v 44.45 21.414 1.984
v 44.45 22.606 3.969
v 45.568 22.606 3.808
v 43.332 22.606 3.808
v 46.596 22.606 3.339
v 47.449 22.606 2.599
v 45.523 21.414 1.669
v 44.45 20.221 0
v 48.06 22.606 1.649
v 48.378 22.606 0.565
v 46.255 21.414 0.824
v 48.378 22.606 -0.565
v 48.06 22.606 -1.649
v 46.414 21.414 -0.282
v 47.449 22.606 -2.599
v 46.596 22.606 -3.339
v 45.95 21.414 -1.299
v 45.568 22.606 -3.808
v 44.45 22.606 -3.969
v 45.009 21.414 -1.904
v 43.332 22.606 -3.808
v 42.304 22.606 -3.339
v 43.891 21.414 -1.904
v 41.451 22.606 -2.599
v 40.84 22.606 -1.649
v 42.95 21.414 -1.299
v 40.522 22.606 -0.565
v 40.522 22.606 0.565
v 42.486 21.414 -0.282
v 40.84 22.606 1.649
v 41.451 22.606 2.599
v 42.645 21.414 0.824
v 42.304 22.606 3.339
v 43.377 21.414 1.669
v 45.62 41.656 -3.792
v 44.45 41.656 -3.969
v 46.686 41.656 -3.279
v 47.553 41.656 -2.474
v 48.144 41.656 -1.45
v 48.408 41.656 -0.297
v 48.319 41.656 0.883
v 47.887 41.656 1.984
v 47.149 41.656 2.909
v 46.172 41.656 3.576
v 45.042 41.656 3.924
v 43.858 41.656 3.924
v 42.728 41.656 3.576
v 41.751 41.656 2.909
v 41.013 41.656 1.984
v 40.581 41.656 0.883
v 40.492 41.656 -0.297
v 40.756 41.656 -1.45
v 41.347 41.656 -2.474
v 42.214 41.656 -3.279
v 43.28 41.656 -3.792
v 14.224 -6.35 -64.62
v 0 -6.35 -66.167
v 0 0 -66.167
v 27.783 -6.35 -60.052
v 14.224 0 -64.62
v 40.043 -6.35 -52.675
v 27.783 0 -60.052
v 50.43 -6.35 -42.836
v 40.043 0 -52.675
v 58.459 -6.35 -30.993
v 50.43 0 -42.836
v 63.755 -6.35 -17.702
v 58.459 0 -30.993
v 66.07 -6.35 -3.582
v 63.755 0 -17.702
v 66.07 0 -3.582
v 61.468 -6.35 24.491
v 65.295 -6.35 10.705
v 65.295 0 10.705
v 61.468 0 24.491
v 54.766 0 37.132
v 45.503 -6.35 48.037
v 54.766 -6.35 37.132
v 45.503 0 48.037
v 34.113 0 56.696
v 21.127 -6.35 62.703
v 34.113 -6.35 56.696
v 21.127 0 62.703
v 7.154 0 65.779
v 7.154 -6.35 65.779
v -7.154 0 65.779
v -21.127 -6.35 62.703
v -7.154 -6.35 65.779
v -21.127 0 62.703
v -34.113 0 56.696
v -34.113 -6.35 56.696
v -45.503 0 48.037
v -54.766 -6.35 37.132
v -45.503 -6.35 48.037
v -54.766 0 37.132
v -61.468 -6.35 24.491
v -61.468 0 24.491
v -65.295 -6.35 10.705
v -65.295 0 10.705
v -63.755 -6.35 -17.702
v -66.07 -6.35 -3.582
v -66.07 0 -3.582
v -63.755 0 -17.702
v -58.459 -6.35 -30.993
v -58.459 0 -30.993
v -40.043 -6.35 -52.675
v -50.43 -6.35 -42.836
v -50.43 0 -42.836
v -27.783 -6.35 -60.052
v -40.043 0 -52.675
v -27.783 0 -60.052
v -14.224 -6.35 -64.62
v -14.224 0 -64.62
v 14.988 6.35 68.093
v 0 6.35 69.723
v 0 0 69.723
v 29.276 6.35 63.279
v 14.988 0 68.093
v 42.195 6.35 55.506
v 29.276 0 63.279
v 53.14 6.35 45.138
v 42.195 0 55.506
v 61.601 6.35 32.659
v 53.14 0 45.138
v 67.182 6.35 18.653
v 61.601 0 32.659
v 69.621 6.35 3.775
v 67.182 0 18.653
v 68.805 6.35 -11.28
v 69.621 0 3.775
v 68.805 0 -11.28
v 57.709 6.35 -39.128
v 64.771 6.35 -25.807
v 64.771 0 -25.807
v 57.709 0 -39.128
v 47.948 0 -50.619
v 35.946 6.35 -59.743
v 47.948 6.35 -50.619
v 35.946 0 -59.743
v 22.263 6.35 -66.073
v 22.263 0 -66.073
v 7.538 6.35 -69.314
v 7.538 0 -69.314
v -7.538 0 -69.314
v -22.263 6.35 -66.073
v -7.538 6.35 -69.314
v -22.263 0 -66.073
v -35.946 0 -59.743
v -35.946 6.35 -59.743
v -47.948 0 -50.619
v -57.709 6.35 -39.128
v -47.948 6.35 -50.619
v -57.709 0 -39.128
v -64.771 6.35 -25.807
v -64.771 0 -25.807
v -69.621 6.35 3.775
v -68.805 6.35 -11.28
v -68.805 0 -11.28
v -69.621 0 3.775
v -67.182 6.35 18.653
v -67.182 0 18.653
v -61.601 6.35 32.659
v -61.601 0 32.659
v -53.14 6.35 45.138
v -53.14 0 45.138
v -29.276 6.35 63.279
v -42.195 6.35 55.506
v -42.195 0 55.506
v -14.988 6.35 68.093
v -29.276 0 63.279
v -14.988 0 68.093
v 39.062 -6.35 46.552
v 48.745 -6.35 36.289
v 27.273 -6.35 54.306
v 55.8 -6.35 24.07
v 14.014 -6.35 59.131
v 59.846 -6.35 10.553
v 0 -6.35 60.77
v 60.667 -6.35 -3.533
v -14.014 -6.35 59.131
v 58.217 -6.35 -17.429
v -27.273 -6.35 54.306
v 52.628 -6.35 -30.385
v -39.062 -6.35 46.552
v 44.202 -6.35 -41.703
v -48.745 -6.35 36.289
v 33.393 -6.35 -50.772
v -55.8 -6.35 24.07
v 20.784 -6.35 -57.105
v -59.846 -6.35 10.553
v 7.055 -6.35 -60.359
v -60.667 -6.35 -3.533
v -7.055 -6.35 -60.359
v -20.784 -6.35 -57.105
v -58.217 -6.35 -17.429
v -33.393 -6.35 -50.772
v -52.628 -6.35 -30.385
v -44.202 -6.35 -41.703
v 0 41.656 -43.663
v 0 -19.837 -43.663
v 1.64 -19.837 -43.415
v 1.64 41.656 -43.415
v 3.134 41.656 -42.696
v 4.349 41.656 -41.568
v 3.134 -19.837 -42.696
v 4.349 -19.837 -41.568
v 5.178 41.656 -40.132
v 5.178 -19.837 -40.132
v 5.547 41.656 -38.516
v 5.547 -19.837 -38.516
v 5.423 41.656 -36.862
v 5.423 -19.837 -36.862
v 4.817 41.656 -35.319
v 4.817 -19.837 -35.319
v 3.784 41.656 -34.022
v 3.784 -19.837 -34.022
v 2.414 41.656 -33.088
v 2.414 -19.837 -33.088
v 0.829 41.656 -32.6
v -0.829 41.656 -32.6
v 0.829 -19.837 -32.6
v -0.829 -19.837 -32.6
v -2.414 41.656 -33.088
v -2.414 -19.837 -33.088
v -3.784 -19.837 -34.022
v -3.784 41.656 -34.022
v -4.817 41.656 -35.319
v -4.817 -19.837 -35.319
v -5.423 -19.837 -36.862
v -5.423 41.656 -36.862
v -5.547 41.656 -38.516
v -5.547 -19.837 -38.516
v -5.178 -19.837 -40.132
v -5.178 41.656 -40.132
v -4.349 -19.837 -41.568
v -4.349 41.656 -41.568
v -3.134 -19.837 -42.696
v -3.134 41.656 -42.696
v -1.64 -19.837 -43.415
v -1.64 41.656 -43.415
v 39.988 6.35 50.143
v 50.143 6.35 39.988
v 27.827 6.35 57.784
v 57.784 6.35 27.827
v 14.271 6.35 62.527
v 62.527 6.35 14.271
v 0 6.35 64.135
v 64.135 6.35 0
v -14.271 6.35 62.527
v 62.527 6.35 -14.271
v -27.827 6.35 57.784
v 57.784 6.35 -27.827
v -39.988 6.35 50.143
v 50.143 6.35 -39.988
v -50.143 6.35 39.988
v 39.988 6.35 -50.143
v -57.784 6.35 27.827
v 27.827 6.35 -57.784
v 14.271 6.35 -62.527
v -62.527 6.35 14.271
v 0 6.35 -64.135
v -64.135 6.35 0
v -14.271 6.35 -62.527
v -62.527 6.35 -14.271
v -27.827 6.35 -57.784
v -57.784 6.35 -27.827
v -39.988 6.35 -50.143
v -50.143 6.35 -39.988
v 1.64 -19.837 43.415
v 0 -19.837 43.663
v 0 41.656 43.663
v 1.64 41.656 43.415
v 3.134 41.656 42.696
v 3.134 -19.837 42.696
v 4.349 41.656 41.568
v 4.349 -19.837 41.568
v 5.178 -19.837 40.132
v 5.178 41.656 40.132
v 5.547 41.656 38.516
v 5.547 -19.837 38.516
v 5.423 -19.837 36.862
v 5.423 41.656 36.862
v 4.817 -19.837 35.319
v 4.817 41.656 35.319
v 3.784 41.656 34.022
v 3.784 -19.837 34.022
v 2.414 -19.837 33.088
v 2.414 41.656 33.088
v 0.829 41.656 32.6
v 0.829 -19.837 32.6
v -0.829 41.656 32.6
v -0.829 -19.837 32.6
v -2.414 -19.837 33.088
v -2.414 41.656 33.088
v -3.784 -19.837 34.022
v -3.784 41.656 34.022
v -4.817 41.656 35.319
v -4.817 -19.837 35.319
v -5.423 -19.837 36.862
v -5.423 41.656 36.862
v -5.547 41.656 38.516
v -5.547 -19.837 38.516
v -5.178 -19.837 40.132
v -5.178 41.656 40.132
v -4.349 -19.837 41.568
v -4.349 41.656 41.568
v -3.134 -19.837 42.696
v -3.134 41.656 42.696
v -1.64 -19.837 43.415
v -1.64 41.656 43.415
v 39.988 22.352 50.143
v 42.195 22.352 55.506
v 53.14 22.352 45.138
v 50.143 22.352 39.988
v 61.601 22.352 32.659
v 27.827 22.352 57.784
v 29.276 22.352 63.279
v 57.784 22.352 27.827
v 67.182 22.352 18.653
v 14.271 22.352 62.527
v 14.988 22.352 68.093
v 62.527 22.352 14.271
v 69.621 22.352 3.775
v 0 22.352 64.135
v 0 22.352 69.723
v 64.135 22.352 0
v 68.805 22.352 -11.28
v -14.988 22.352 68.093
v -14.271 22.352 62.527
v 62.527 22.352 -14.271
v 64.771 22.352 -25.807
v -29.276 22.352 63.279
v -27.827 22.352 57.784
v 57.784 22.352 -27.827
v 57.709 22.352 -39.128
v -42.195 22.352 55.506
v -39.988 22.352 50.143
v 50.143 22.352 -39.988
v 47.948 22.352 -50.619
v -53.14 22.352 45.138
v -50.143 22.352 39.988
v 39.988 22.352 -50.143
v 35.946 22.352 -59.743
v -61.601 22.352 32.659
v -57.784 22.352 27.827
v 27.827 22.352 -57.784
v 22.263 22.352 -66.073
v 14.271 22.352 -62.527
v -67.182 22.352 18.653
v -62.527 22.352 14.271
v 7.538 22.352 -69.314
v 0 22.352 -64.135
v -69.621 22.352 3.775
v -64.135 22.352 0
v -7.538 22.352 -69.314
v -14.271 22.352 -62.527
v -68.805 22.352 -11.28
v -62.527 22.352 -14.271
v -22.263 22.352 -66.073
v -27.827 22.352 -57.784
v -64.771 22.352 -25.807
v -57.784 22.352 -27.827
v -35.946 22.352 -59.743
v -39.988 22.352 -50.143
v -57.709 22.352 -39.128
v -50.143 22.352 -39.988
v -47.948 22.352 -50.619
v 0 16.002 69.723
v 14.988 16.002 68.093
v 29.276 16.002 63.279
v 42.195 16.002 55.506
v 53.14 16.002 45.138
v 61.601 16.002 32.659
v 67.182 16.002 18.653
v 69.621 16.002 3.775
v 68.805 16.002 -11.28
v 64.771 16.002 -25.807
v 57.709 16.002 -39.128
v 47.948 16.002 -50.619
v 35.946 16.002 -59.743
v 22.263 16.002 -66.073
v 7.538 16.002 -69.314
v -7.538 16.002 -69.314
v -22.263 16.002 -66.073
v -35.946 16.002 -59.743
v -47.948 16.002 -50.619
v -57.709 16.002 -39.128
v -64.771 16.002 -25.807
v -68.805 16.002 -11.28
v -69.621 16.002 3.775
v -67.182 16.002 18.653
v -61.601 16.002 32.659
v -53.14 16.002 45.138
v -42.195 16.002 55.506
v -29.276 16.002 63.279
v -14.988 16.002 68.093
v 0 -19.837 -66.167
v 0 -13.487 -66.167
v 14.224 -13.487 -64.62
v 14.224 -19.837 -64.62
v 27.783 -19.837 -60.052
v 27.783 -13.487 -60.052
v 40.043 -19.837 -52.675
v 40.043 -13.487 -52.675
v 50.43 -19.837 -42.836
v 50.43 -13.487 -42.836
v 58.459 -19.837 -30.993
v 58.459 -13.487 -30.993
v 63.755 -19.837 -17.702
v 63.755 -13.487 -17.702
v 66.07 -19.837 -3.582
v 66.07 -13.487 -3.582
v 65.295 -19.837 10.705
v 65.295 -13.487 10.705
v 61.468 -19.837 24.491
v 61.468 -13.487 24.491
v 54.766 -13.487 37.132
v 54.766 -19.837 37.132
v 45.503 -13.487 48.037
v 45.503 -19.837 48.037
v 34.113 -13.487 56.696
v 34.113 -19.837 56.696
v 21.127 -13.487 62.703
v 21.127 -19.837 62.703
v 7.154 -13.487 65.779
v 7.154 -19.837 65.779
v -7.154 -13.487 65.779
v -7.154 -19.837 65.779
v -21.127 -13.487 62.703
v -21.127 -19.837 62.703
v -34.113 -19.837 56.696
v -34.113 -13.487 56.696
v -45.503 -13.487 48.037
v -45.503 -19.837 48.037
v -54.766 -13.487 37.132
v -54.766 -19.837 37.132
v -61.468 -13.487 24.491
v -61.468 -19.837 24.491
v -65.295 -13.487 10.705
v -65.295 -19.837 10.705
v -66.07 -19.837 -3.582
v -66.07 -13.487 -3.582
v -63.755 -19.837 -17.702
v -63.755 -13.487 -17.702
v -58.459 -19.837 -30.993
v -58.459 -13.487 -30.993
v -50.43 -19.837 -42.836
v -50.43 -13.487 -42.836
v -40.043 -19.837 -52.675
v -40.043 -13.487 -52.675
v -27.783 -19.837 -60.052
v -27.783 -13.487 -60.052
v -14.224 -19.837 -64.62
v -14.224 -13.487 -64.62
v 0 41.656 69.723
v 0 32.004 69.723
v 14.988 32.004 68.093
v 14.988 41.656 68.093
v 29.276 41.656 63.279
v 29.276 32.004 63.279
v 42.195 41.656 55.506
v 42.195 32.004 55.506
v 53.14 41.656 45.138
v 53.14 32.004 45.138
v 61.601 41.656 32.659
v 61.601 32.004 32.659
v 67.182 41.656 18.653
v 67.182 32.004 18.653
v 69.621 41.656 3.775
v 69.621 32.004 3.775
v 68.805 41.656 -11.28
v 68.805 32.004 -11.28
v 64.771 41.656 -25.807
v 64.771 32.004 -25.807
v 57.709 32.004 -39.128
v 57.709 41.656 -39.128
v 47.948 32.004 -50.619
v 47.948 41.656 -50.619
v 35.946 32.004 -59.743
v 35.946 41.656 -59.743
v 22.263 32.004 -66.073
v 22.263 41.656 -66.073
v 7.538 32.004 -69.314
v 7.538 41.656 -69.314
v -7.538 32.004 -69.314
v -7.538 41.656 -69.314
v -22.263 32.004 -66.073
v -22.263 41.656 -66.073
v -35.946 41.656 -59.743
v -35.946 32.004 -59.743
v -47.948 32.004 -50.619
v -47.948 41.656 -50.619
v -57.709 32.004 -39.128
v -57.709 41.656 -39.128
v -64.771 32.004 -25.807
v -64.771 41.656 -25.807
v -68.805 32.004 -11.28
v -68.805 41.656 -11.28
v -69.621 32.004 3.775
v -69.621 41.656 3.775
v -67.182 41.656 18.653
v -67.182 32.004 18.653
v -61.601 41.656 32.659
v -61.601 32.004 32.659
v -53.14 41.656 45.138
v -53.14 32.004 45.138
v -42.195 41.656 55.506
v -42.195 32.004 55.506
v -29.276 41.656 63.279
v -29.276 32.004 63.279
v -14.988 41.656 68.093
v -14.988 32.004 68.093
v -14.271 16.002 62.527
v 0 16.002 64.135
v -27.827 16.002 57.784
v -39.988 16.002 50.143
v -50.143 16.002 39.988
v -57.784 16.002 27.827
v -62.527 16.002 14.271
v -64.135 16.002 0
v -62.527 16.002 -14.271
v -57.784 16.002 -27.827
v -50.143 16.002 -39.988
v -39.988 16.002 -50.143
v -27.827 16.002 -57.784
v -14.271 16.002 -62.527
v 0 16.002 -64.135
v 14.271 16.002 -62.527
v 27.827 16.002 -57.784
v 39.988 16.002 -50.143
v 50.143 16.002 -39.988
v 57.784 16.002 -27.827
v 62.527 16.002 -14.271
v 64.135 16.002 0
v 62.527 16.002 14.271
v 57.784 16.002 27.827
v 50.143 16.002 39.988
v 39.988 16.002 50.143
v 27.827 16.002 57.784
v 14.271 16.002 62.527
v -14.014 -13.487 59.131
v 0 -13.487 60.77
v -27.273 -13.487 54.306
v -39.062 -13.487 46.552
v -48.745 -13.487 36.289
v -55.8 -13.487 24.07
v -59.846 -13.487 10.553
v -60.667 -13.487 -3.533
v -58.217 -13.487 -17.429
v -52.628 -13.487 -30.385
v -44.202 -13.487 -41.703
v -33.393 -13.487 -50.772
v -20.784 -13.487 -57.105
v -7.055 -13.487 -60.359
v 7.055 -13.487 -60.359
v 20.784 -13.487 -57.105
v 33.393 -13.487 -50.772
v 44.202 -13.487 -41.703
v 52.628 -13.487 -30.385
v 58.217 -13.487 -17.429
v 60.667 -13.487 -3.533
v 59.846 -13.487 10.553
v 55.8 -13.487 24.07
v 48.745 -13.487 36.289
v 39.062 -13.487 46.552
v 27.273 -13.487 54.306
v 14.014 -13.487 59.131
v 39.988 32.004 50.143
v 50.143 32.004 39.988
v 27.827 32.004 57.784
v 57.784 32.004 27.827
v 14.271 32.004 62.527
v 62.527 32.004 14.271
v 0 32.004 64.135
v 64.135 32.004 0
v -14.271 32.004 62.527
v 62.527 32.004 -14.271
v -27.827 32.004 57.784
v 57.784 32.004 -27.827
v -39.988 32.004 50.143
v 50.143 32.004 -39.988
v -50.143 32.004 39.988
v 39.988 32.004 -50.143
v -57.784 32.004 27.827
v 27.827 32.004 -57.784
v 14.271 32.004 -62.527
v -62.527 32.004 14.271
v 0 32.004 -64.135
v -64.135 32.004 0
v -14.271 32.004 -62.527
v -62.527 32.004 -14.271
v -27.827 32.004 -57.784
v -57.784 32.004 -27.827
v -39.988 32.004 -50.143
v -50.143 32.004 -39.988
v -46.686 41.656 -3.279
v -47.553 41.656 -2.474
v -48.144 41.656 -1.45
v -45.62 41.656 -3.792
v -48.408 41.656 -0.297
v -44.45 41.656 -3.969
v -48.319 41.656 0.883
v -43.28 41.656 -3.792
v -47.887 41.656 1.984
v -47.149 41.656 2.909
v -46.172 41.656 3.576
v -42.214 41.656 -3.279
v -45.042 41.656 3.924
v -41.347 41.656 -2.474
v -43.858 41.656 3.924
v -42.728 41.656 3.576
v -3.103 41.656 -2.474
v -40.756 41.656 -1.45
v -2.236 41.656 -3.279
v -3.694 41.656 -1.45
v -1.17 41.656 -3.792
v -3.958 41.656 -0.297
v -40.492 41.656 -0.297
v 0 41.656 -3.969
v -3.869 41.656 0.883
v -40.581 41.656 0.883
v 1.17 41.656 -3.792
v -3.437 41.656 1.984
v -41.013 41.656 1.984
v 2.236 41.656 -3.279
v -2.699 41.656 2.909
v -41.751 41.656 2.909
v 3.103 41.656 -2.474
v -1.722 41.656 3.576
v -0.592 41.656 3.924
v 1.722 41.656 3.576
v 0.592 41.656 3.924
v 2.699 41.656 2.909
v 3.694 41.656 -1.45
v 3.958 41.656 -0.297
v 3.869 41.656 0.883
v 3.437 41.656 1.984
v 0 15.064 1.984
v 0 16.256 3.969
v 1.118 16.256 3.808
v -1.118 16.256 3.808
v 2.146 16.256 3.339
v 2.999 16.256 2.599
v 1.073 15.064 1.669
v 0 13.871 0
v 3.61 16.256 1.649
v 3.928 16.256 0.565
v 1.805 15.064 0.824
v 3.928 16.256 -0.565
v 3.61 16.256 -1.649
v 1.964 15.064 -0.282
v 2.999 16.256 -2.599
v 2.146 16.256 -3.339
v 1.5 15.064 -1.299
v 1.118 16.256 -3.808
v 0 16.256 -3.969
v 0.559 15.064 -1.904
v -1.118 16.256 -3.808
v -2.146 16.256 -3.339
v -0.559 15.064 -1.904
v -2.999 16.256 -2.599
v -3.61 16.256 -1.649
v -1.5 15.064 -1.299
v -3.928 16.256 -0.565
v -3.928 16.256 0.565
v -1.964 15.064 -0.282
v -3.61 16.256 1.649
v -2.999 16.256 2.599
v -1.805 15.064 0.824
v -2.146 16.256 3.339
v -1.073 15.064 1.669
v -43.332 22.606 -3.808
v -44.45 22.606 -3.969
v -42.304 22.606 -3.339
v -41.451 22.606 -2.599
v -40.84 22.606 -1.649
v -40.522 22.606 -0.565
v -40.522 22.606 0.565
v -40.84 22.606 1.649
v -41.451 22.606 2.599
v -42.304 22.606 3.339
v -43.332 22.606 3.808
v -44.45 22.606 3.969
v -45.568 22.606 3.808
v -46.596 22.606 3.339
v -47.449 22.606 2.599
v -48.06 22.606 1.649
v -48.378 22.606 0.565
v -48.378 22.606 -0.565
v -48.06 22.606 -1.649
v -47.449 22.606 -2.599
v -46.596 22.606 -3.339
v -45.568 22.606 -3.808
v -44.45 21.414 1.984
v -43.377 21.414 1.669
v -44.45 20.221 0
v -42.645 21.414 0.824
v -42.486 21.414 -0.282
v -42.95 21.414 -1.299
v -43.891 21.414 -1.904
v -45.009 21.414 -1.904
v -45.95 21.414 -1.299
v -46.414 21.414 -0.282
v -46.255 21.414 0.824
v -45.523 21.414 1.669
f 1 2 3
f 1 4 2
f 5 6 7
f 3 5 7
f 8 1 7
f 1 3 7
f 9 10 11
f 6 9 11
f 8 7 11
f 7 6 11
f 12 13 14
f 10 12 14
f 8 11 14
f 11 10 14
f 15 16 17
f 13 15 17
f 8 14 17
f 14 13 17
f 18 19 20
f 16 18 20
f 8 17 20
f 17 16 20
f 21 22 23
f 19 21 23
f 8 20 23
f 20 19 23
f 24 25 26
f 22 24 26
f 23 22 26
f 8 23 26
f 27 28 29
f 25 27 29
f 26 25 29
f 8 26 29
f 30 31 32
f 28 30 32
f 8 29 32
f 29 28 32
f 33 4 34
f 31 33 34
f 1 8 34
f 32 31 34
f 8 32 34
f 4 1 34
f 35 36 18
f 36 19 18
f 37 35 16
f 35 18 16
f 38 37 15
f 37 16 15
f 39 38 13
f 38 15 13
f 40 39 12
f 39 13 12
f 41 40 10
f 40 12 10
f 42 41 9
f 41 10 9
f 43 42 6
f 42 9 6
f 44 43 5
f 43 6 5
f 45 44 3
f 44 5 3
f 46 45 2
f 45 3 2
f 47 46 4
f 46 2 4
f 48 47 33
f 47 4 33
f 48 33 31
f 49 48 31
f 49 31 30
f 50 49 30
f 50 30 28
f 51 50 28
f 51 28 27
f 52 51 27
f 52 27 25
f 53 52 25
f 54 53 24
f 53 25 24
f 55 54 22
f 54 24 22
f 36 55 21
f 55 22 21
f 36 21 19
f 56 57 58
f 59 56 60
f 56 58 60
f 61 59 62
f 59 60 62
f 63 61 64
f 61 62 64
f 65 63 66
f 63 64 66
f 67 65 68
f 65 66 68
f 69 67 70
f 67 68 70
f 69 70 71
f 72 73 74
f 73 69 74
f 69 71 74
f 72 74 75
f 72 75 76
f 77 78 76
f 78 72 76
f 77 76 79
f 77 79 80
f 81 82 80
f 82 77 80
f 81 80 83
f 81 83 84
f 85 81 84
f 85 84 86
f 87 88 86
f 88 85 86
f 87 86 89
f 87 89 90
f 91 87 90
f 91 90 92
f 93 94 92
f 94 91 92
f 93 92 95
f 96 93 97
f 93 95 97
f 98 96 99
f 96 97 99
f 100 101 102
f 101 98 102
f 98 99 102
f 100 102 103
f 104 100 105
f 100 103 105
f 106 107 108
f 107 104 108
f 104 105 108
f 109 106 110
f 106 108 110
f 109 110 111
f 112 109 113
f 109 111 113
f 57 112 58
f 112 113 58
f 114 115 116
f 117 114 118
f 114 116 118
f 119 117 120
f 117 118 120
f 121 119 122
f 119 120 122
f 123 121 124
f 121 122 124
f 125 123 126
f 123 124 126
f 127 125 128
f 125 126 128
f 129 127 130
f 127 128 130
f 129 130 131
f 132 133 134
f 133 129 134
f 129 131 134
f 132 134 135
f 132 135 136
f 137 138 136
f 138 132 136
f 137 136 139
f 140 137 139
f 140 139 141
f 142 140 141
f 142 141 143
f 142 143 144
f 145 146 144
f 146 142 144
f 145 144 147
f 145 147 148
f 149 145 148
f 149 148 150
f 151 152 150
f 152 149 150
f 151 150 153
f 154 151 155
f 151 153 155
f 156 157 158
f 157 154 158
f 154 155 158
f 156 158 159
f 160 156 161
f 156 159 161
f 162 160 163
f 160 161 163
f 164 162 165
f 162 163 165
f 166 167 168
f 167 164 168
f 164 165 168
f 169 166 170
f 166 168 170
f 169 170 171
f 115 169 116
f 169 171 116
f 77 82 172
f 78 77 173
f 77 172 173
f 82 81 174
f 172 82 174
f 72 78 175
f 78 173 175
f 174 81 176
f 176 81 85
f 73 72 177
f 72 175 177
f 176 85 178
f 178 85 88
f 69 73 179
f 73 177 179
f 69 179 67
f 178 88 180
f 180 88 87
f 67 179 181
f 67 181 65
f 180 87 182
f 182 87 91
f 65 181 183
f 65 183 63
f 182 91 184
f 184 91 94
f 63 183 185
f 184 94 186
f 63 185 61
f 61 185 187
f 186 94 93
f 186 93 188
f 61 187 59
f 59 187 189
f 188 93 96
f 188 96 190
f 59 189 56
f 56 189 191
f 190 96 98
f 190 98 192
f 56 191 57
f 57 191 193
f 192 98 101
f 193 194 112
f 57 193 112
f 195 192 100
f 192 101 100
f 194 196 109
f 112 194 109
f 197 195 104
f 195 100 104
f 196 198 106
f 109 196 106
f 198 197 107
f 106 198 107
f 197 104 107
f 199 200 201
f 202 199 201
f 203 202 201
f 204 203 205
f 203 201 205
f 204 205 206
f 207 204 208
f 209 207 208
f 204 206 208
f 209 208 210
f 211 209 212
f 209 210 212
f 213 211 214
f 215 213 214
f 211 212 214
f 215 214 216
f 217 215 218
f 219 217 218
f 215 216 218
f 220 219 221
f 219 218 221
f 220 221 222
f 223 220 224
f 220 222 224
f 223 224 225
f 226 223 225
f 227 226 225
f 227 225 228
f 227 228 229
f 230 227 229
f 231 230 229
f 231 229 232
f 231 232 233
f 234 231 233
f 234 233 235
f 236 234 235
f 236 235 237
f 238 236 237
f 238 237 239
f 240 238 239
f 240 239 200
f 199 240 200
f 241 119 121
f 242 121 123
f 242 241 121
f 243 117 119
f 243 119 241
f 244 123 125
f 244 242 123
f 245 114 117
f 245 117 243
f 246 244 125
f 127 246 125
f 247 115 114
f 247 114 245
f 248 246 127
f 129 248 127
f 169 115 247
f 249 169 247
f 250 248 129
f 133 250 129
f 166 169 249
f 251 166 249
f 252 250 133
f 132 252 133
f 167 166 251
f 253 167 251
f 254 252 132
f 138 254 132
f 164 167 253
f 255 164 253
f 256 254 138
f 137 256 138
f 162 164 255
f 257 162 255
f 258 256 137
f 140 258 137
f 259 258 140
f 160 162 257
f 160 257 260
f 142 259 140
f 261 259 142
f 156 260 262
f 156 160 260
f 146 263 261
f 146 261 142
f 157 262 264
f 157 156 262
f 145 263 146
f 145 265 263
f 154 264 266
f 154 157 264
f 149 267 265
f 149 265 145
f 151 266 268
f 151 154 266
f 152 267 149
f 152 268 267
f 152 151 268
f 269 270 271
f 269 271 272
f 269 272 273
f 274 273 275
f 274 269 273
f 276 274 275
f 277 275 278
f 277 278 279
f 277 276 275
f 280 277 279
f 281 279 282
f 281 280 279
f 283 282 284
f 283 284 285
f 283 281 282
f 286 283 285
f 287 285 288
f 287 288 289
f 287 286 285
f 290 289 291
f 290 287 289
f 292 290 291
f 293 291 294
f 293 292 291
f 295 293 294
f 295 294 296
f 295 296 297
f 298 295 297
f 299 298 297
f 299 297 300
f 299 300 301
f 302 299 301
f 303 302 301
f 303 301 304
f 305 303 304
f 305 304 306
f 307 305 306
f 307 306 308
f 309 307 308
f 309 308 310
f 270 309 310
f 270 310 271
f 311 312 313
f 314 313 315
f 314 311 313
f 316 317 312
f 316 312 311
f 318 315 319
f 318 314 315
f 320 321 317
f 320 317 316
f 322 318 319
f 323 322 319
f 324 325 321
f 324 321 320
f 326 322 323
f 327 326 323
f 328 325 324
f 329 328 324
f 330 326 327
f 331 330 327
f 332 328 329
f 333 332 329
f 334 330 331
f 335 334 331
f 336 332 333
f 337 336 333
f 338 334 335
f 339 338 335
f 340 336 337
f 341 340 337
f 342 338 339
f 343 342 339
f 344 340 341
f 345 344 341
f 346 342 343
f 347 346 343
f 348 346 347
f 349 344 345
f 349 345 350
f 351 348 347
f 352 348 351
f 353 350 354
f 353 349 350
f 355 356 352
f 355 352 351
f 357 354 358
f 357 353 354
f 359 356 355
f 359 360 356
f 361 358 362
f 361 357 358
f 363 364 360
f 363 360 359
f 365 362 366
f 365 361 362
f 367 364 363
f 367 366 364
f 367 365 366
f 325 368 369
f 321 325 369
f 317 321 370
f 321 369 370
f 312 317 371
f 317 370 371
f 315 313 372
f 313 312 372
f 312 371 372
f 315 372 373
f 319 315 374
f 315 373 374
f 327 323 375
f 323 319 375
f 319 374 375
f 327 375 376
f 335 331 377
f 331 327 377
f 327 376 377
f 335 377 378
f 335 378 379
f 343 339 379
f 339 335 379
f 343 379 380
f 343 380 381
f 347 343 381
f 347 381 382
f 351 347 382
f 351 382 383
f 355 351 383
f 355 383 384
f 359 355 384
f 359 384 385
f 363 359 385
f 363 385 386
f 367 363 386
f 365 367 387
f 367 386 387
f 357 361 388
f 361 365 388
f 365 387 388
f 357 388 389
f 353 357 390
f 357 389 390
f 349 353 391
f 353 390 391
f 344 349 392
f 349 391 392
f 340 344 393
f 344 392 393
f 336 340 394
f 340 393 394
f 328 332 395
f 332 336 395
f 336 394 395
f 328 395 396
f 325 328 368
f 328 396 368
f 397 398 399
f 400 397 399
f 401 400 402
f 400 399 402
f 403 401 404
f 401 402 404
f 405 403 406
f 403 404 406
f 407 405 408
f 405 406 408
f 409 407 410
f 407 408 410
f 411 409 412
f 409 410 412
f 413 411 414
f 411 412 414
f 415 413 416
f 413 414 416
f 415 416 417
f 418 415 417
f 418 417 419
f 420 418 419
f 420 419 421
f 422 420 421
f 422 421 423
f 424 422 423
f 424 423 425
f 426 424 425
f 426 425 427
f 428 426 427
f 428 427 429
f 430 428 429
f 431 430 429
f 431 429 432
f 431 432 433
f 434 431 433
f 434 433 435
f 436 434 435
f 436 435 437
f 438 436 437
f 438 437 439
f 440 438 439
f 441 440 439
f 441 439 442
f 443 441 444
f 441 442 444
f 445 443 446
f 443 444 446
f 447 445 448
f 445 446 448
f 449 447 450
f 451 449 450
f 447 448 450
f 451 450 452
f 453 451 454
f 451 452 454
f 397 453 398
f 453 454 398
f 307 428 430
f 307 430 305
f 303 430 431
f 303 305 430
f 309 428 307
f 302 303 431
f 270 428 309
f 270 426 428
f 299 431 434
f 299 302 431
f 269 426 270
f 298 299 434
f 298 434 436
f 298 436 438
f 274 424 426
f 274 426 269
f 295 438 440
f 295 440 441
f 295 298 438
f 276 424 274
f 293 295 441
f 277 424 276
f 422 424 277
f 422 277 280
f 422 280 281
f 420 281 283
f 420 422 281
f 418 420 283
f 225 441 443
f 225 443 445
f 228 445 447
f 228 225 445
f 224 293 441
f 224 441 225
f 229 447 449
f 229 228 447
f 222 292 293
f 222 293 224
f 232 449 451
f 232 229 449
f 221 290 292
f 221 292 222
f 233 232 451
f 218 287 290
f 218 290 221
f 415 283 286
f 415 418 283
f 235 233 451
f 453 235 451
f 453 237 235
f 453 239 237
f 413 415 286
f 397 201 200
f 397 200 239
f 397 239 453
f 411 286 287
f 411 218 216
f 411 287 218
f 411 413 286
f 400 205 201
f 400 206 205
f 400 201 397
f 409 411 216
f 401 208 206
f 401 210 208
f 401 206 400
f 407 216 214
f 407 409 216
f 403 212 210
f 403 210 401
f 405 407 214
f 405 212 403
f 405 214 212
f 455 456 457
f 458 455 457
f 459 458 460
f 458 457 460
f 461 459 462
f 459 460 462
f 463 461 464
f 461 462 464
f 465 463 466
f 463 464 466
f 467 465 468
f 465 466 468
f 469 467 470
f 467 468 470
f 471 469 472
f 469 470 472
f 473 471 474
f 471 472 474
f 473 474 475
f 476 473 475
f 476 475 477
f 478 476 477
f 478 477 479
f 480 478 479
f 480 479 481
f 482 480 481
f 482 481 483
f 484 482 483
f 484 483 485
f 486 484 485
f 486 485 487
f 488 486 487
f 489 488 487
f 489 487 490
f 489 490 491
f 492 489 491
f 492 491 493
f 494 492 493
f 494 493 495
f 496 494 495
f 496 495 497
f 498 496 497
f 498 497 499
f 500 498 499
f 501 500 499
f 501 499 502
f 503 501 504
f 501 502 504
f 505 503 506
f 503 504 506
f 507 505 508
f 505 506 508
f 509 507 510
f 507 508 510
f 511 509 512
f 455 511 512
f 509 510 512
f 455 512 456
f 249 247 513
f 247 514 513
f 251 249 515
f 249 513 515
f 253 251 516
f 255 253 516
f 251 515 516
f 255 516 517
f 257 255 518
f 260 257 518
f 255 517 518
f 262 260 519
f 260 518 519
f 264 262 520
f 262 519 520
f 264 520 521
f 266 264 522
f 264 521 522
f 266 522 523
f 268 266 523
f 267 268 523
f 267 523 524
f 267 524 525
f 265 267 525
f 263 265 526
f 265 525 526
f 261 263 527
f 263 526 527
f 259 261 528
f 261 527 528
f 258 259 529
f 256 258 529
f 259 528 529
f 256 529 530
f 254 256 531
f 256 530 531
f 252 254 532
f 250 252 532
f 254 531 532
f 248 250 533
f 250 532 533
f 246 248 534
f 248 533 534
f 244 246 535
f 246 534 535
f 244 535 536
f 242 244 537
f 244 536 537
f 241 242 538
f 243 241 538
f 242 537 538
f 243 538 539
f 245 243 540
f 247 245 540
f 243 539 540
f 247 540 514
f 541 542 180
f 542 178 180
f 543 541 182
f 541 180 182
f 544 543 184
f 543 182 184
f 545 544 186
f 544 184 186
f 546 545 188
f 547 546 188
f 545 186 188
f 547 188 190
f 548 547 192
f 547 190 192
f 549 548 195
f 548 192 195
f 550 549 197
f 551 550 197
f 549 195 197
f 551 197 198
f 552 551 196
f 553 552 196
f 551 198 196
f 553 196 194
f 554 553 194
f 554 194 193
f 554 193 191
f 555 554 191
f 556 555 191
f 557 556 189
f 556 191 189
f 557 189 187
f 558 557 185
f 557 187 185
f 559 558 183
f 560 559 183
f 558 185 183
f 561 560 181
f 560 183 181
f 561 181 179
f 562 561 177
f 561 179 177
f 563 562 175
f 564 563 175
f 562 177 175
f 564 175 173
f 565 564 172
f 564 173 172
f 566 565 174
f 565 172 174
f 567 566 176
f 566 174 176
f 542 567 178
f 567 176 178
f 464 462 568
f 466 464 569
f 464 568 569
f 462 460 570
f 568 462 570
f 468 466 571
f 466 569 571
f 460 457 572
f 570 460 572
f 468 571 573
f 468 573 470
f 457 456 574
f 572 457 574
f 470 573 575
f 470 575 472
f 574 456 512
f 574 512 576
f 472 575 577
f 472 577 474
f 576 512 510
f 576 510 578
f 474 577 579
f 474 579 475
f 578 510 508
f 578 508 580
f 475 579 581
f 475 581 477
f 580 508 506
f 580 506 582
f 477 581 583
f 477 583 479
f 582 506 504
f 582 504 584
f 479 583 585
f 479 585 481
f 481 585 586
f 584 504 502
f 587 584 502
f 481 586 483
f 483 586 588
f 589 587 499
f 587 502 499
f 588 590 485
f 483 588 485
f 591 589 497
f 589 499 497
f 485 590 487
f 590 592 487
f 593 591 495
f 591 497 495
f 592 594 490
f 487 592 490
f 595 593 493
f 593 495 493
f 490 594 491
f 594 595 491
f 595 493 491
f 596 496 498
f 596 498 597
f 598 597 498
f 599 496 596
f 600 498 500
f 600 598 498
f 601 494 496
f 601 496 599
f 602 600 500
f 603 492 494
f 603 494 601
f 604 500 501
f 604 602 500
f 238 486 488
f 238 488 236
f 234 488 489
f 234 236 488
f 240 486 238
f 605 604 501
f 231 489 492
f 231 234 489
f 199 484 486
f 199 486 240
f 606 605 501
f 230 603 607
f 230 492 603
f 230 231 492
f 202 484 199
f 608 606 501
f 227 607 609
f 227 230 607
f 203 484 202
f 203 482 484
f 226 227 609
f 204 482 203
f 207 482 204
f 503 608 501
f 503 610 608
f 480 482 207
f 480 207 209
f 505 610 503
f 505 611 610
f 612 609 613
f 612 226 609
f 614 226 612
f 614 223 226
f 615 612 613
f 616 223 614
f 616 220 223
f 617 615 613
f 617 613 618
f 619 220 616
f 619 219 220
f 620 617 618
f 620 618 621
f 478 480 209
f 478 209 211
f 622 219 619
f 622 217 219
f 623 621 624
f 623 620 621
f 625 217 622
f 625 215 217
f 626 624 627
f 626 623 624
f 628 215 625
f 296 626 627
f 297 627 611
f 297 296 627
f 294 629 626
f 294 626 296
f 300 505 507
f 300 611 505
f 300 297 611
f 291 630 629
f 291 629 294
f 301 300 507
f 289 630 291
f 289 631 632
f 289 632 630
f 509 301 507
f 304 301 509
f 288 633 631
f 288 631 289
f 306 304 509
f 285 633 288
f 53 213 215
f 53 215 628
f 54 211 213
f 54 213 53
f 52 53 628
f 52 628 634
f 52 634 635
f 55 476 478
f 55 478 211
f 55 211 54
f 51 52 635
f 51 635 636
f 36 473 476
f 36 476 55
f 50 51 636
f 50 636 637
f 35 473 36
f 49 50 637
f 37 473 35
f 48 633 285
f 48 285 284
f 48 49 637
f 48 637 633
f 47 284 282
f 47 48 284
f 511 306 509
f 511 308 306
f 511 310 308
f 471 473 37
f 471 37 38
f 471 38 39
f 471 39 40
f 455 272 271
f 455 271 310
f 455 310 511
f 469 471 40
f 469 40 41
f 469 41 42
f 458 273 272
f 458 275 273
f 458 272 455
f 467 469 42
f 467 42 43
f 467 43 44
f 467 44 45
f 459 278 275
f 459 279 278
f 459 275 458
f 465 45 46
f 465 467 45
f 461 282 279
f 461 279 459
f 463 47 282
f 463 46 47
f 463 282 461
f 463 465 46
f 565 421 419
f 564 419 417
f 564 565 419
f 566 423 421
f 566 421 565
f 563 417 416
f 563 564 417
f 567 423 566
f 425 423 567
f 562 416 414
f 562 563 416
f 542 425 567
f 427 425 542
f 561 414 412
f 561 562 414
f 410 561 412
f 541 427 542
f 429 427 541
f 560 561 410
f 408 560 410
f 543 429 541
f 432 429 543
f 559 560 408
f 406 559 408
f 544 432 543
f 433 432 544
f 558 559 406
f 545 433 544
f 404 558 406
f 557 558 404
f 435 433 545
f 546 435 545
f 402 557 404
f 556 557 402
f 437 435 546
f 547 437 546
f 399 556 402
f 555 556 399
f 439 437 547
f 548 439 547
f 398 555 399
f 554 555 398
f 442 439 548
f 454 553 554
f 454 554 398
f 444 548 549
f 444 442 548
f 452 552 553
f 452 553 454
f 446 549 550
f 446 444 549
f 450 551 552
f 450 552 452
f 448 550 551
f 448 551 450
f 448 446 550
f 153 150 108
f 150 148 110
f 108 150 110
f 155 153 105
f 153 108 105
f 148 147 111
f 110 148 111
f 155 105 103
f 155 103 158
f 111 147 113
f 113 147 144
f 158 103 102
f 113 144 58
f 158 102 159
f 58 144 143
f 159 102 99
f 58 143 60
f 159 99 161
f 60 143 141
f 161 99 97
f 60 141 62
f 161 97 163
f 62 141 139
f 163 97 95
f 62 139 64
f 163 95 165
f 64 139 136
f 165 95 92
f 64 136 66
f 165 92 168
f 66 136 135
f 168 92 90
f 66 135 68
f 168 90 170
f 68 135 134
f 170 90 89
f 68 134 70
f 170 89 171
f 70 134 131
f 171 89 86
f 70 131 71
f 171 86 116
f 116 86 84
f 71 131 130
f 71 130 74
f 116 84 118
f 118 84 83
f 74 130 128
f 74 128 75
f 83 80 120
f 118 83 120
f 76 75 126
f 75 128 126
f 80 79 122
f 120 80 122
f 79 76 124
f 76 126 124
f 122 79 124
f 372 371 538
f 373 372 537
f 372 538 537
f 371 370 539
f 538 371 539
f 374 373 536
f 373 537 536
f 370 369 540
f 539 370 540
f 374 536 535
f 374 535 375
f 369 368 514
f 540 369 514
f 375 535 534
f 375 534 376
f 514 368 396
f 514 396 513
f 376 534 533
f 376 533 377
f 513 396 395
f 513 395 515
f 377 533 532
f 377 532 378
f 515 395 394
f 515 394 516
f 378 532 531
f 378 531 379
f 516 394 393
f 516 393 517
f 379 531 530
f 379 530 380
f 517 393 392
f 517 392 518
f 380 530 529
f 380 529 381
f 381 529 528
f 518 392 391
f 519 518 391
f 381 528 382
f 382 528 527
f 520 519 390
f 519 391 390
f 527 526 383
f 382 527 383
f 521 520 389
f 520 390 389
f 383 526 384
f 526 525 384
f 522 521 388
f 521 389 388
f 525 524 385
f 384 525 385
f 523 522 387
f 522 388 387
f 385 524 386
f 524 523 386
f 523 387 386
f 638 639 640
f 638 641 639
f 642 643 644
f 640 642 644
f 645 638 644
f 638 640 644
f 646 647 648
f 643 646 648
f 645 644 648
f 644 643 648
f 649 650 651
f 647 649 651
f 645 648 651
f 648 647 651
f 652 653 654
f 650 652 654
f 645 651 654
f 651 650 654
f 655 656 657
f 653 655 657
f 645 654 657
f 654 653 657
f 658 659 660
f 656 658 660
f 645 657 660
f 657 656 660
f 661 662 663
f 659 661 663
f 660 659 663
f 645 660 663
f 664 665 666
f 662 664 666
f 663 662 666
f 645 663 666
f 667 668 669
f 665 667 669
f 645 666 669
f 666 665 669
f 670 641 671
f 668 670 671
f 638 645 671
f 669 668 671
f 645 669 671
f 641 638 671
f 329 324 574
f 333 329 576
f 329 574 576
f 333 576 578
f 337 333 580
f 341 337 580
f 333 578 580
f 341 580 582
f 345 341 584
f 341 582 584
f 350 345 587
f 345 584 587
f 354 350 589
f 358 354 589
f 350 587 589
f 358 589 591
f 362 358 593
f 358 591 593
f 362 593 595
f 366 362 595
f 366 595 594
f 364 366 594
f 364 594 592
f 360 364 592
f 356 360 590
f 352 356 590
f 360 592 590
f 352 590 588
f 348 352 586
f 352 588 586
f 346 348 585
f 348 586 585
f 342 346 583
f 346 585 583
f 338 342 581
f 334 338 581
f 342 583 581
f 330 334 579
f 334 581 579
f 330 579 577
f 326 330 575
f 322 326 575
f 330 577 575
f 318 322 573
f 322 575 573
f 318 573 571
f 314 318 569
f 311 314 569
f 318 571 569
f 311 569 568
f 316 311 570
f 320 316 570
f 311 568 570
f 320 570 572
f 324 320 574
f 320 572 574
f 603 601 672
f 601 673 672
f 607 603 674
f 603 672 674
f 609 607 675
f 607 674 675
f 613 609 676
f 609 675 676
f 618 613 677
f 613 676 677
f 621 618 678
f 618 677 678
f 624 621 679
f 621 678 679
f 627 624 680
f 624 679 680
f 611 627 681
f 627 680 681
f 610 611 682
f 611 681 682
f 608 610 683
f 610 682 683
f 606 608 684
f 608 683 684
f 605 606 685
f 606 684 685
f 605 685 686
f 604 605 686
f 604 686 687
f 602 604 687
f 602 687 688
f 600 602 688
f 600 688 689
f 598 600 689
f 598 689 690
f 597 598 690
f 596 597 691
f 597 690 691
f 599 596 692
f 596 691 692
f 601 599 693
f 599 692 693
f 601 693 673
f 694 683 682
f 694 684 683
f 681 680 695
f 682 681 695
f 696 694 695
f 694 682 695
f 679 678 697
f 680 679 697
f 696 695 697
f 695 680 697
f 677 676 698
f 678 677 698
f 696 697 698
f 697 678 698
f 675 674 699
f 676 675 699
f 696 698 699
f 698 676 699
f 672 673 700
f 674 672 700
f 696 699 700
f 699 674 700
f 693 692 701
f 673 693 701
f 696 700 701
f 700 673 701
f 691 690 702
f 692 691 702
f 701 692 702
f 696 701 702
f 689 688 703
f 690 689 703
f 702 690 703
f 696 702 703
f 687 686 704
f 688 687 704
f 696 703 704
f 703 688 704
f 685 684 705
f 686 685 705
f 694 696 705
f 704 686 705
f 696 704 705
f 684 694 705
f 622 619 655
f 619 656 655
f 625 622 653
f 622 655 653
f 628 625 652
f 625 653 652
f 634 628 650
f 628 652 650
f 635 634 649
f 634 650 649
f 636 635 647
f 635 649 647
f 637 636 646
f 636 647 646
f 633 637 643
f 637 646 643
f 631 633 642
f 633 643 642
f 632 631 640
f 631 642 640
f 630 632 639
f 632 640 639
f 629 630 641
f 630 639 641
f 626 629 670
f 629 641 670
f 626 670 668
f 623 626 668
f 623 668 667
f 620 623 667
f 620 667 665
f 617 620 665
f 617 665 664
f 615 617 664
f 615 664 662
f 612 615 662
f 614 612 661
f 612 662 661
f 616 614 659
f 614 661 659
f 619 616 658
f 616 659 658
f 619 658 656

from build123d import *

# Parameters (mm, degrees)
SKETCH1_R                         = 69.723
BOSS_EXTRUDE1_DEPTH               = 41.656
SKETCH3_W                         = 5.588
SKETCH3_H                         = 9.652
SKETCH4_R                         = 66.167
BOSS_EXTRUDE2_DEPTH               = 19.8374
SKETCH5_W                         = 5.3975
SKETCH5_H                         = 7.1374
PIPE_TAP_DRILL_FOR_1_4_TAP1_D     = 11.1252
TAP_DRILL_FOR_3_8_16_TAP1_D       = 7.9375
TAP_DRILL_FOR_3_8_16_TAP1_DEPTH   = 25.4
TAP_DRILL_FOR_3_8_16_TAP1_TIP     = 2.384665582
PIPE_TAP_DRILL_FOR_1_4_TAP2_D     = 11.1252
PIPE_TAP_DRILL_FOR_1_4_TAP2_DEPTH = 61.4934
TAP_DRILL_FOR_3_8_16_TAP2_D       = 7.9375
TAP_DRILL_FOR_3_8_16_TAP2_DEPTH   = 19.05
TAP_DRILL_FOR_3_8_16_TAP2_TIP     = 2.384665582


with BuildPart() as part:
    # Sketch1 → Boss-Extrude1 (new body)
    with BuildSketch(Plane(origin=(0, 0, 0), x_dir=(1, 0, 0), z_dir=(0, 1, 0))):
        with Locations(Location((0, 0, 0), (0, 0, 270))):
            Circle(SKETCH1_R)
    extrude(amount=BOSS_EXTRUDE1_DEPTH)

    # Sketch3 → Cut-Revolve1 (revolve, cut)
    with BuildSketch(Plane(origin=(0, 0, 0), x_dir=(0, 0, -1), z_dir=(1, 0, 0)), mode=Mode.PRIVATE) as cut_revolve1_sk:
        with Locations((66.929, 27.178)):
            Rectangle(SKETCH3_W, SKETCH3_H)
        with Locations((66.929, 11.176)):
            Rectangle(SKETCH3_W, SKETCH3_H)
    revolve(cut_revolve1_sk.sketch.rotate(Axis((0, 41.656, 0), (0, -1, 0)), 180), axis=Axis((0, 41.656, 0), (0, -1, 0)), mode=Mode.SUBTRACT)

    # Sketch4 → Boss-Extrude2 (add)
    with BuildSketch(Plane.XZ):
        with Locations(Location((0, 0, 0), (0, 0, 270))):
            Circle(SKETCH4_R)
    extrude(amount=BOSS_EXTRUDE2_DEPTH)

    # Sketch5 → Cut-Revolve2 (revolve, cut)
    with BuildSketch(Plane(origin=(0, 0, 0), x_dir=(0, 0, -1), z_dir=(1, 0, 0)), mode=Mode.PRIVATE) as cut_revolve2_sk:
        with Locations((63.46825, -9.9187)):
            Rectangle(SKETCH5_W, SKETCH5_H)
    revolve(cut_revolve2_sk.sketch.rotate(Axis((0, 41.656, 0), (0, -1, 0)), 180), axis=Axis((0, 41.656, 0), (0, -1, 0)), mode=Mode.SUBTRACT)

    # Pipe Tap Drill for 1/4 Tap1 (through all)
    with Locations(Plane(origin=(0, 41.656, -38.1), x_dir=(0, 0, 1), z_dir=(0, 1, 0))):
        with Locations((0, 0)):
            pipe_tap_drill_for_1_4_tap1 = Hole(PIPE_TAP_DRILL_FOR_1_4_TAP1_D / 2)

    # Mirror1: Pipe Tap Drill for 1/4 Tap1 across plane
    add(pipe_tap_drill_for_1_4_tap1.mirror(Plane.XY), mode=Mode.SUBTRACT)

    # Tap Drill for 3/8-16 Tap1
    with Locations(Plane.ZX.offset(41.656)):
        with Locations((0, 0)):
            Hole(TAP_DRILL_FOR_3_8_16_TAP1_D / 2, depth=TAP_DRILL_FOR_3_8_16_TAP1_DEPTH)
            with Locations((0, 0, -(TAP_DRILL_FOR_3_8_16_TAP1_DEPTH + TAP_DRILL_FOR_3_8_16_TAP1_TIP / 2))):  # 118° drill point
                Cone(0, TAP_DRILL_FOR_3_8_16_TAP1_D / 2, TAP_DRILL_FOR_3_8_16_TAP1_TIP, mode=Mode.SUBTRACT)

    # Pipe Tap Drill for 1/4 Tap2
    with Locations(Plane(origin=(0, 41.656, 38.1), x_dir=(0, 0, 1), z_dir=(0, 1, 0))):
        with Locations((0, 0), (-76.2, 0)):
            Hole(PIPE_TAP_DRILL_FOR_1_4_TAP2_D / 2, depth=PIPE_TAP_DRILL_FOR_1_4_TAP2_DEPTH)

    # Tap Drill for 3/8-16 Tap2
    with Locations(Plane(origin=(-44.45, 41.656, 0), x_dir=(0, 0, 1), z_dir=(0, 1, 0))):
        with Locations((0, 0), (0, 88.9)):
            Hole(TAP_DRILL_FOR_3_8_16_TAP2_D / 2, depth=TAP_DRILL_FOR_3_8_16_TAP2_DEPTH)
            with Locations((0, 0, -(TAP_DRILL_FOR_3_8_16_TAP2_DEPTH + TAP_DRILL_FOR_3_8_16_TAP2_TIP / 2))):  # 118° drill point
                Cone(0, TAP_DRILL_FOR_3_8_16_TAP2_D / 2, TAP_DRILL_FOR_3_8_16_TAP2_TIP, mode=Mode.SUBTRACT)


solid = part.part
